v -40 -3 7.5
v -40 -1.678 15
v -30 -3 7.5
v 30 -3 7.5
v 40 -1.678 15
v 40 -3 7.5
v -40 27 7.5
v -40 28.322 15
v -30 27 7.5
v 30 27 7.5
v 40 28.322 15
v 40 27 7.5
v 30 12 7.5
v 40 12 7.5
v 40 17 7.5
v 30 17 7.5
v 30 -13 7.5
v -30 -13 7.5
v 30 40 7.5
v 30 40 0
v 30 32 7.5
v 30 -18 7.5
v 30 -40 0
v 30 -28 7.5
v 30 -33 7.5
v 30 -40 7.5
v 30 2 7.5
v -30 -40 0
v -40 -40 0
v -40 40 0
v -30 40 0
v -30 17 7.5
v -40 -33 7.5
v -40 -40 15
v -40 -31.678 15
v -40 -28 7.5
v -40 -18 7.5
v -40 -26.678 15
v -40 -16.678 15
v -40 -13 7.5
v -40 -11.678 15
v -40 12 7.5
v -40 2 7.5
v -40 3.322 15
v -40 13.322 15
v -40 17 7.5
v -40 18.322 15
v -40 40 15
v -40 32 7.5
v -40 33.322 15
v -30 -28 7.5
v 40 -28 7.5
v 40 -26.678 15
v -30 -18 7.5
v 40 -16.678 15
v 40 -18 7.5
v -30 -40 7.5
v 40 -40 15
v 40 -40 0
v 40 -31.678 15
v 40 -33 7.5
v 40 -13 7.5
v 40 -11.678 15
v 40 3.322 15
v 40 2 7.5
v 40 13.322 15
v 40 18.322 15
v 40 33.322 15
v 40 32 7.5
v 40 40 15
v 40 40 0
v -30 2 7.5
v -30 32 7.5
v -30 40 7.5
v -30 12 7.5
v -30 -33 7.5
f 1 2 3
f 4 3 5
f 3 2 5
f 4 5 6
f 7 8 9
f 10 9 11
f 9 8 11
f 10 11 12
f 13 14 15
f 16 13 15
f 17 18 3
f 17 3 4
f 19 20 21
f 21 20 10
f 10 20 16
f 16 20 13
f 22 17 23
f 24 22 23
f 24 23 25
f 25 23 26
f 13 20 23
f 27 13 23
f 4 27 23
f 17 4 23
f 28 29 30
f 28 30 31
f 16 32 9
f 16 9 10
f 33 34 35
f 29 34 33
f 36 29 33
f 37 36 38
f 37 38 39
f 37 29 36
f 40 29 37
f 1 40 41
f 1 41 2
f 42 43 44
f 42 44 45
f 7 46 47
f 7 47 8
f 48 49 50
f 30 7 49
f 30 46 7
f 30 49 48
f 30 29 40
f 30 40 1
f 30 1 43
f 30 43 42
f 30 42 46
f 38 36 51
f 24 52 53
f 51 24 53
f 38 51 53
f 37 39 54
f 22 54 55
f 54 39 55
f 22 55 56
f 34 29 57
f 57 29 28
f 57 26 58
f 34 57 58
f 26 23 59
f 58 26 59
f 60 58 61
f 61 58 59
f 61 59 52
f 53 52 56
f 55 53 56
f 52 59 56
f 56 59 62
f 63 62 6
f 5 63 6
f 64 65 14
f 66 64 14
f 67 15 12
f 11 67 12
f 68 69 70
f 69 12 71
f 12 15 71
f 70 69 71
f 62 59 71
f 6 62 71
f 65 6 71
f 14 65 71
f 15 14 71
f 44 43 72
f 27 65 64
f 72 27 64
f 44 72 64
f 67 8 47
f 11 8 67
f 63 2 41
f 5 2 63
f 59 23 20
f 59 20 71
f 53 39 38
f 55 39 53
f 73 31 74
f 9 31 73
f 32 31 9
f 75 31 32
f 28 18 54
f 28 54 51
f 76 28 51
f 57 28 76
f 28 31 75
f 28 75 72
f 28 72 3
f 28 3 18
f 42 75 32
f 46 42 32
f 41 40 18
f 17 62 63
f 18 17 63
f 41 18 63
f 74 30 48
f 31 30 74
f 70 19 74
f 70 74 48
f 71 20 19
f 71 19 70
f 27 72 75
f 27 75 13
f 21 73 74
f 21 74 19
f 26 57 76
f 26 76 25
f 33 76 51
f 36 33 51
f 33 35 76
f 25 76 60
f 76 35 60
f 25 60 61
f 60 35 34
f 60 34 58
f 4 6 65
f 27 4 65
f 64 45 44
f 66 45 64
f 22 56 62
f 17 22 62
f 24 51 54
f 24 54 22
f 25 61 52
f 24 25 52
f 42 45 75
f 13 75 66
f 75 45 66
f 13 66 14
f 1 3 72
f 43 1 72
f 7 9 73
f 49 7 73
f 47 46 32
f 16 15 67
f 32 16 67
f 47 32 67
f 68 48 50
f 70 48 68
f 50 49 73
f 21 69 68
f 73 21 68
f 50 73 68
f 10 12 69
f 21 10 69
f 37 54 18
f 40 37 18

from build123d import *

# Parameters (mm, degrees)
F0_W     = 80
F0_H     = 80
F1_DEPTH = 15
F3_DEPTH = 111
F4_W     = 60
F4_H     = 7.5
F5_DEPTH = 111


with BuildPart() as f1:
    # F0 (on Top) → F1 (new body)
    with BuildSketch(Plane.XY):
        Rectangle(F0_W, F0_H)
    extrude(amount=F1_DEPTH)

    # F2 (on face) → F3 (cut)
    with BuildSketch(Plane.YZ.offset(40)):
        Polygon((-26.677548, 15), (-31.677548, 15), (-33, 7.5), (-28, 7.5), align=None)
        Polygon((-11.677548, 15), (-16.677548, 15), (-18, 7.5), (-13, 7.5), align=None)
        Polygon((3.322452, 15), (-1.677548, 15), (-3, 7.5), (2, 7.5), align=None)
        Polygon((18.322452, 15), (13.322452, 15), (12, 7.5), (17, 7.5), align=None)
        Polygon((32, 7.5), (33.322452, 15), (28.322452, 15), (27, 7.5), align=None)
    extrude(amount=-F3_DEPTH, mode=Mode.SUBTRACT)

    # F4 (on face) → F5 (cut)
    with BuildSketch(Plane.XZ.offset(40)):
        with Locations((0, 3.75)):
            Rectangle(F4_W, F4_H)
    extrude(amount=-F5_DEPTH, mode=Mode.SUBTRACT)


solid = f1.part
